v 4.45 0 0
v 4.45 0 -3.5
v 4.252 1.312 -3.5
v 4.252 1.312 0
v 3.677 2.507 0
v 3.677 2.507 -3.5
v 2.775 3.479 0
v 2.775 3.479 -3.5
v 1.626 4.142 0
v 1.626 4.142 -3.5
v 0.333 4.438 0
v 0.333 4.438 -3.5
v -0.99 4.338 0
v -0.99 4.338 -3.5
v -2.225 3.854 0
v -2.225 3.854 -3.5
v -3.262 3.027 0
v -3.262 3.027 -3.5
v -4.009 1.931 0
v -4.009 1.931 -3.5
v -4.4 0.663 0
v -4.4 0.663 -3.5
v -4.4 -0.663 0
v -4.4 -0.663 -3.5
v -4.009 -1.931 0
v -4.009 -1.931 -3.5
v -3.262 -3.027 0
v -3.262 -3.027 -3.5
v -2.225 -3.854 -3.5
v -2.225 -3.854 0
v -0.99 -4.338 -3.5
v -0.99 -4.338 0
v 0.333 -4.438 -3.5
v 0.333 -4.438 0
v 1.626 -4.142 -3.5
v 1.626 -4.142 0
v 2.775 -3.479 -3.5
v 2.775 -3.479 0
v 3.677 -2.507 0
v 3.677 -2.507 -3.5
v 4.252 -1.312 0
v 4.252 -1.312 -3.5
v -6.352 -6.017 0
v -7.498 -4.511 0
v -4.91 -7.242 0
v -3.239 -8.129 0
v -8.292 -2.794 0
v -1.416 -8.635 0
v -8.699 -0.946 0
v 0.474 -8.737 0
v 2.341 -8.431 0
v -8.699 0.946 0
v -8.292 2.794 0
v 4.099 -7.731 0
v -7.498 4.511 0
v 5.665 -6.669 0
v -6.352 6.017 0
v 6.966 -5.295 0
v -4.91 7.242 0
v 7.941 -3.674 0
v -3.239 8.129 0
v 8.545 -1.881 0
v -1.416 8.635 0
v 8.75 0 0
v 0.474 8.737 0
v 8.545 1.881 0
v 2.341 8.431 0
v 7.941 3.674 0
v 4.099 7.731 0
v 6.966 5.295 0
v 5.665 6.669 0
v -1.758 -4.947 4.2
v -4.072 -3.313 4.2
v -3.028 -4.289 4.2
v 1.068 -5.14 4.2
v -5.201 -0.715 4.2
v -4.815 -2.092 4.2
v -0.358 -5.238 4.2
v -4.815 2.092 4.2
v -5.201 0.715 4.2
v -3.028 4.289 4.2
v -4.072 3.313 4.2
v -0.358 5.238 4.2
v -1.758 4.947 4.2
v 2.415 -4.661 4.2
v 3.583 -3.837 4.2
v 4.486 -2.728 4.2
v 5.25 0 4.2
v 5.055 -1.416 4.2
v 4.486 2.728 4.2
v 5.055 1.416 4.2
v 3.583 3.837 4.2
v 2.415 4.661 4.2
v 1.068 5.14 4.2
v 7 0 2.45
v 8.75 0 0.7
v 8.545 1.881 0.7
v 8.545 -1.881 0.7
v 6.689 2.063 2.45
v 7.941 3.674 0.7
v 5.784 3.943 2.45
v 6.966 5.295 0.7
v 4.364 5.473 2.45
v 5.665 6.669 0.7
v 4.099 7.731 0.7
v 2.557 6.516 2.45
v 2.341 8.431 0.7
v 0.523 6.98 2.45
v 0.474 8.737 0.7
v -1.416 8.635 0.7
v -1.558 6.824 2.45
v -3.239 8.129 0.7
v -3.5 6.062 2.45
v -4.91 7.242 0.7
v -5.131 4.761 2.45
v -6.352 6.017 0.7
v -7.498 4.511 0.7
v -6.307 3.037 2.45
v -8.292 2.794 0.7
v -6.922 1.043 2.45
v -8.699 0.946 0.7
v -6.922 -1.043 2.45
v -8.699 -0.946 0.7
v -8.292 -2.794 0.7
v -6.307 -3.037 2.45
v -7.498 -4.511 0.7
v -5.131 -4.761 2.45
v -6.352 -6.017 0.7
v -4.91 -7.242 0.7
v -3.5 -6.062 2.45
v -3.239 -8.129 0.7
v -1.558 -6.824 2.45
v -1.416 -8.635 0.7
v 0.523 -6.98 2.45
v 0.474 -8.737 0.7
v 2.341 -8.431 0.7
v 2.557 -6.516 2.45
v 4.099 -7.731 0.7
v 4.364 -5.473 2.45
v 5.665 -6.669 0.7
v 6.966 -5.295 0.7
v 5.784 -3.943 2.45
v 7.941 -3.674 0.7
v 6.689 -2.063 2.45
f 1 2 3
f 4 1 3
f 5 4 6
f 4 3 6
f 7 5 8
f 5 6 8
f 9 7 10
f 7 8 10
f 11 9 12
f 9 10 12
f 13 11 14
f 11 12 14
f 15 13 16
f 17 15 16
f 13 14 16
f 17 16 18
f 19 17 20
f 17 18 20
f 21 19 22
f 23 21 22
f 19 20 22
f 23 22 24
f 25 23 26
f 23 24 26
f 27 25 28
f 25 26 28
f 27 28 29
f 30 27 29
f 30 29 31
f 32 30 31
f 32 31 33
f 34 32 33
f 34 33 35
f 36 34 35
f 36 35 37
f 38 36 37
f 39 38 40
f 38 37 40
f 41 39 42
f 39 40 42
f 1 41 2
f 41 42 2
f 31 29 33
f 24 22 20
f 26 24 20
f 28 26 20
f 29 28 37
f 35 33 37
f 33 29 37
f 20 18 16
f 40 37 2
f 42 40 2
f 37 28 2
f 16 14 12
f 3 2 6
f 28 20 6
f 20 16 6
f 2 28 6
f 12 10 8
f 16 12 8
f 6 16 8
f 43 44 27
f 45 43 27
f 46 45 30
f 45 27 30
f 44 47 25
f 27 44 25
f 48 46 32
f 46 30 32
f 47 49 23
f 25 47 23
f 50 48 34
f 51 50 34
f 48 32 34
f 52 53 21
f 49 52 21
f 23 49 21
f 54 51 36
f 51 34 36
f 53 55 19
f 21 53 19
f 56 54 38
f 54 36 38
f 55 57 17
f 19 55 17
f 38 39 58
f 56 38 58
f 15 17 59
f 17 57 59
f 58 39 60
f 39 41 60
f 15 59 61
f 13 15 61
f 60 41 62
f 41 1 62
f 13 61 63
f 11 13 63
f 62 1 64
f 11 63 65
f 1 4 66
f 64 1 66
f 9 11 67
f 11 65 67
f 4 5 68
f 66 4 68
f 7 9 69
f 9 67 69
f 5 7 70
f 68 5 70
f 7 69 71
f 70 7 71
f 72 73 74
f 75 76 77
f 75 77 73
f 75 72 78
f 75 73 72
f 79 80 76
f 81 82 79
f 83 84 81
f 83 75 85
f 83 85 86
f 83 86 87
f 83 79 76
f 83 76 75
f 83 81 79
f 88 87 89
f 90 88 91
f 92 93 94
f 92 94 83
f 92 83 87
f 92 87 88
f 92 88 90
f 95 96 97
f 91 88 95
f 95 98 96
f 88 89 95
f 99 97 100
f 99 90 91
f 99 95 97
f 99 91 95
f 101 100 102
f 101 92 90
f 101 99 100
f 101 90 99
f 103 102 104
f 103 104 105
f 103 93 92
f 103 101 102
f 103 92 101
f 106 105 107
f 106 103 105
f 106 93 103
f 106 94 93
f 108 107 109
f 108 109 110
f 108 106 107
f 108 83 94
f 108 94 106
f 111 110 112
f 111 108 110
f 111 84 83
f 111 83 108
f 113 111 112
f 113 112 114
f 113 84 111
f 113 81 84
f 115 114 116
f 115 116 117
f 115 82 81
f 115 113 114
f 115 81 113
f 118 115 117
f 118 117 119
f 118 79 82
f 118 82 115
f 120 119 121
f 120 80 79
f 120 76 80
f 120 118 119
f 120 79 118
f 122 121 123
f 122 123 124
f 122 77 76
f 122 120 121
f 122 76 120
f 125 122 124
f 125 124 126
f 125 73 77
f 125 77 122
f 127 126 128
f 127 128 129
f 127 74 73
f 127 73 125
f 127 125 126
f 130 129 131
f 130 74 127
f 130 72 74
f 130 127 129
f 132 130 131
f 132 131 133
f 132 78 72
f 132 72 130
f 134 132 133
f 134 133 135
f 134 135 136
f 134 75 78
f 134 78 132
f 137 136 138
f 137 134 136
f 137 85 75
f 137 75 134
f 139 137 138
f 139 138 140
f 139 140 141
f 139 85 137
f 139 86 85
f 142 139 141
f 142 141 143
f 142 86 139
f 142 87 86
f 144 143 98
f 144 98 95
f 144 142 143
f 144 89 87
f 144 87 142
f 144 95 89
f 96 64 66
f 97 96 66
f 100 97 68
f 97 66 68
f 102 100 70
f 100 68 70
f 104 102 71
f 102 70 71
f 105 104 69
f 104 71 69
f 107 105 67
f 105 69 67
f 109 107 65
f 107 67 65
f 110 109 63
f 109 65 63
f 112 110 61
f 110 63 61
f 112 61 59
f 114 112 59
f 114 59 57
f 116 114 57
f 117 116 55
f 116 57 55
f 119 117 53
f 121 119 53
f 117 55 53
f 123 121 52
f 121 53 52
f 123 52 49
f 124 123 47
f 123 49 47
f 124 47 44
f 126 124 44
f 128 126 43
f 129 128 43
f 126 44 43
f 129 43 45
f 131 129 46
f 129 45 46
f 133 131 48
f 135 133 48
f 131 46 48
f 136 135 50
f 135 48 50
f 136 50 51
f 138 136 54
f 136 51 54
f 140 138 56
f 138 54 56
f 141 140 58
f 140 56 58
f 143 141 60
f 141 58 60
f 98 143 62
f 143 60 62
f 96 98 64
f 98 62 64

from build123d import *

# Parameters (mm, degrees)
CYLINDER972_R     = 8.75
CYLINDER972_DEPTH = 4.2
CYLINDER973_R     = 4.45
CYLINDER973_DEPTH = 3.5
CHAMFER008_SIZE   = 3.5


with BuildPart() as cylinder1035:
    # Cylinder972 → Cylinder972 (new body)
    with BuildSketch(Plane.XY):
        Circle(CYLINDER972_R)
    extrude(amount=CYLINDER972_DEPTH)


with BuildPart() as planetary_gear:
    # Cylinder973 → Cylinder973 (new body)
    with BuildSketch(Plane.XY.offset(-3.5)):
        Circle(CYLINDER973_R)
    extrude(amount=CYLINDER973_DEPTH)

    # Fusion111: union Cylinder1035
    add(cylinder1035.part)

    # Chamfer008
    chamfer008_edges = [planetary_gear.edges().sort_by_distance(p)[0] for p in [
        (-8.75, 0, 4.2),
    ]]
    chamfer(chamfer008_edges, length=CHAMFER008_SIZE)


solid = planetary_gear.part
